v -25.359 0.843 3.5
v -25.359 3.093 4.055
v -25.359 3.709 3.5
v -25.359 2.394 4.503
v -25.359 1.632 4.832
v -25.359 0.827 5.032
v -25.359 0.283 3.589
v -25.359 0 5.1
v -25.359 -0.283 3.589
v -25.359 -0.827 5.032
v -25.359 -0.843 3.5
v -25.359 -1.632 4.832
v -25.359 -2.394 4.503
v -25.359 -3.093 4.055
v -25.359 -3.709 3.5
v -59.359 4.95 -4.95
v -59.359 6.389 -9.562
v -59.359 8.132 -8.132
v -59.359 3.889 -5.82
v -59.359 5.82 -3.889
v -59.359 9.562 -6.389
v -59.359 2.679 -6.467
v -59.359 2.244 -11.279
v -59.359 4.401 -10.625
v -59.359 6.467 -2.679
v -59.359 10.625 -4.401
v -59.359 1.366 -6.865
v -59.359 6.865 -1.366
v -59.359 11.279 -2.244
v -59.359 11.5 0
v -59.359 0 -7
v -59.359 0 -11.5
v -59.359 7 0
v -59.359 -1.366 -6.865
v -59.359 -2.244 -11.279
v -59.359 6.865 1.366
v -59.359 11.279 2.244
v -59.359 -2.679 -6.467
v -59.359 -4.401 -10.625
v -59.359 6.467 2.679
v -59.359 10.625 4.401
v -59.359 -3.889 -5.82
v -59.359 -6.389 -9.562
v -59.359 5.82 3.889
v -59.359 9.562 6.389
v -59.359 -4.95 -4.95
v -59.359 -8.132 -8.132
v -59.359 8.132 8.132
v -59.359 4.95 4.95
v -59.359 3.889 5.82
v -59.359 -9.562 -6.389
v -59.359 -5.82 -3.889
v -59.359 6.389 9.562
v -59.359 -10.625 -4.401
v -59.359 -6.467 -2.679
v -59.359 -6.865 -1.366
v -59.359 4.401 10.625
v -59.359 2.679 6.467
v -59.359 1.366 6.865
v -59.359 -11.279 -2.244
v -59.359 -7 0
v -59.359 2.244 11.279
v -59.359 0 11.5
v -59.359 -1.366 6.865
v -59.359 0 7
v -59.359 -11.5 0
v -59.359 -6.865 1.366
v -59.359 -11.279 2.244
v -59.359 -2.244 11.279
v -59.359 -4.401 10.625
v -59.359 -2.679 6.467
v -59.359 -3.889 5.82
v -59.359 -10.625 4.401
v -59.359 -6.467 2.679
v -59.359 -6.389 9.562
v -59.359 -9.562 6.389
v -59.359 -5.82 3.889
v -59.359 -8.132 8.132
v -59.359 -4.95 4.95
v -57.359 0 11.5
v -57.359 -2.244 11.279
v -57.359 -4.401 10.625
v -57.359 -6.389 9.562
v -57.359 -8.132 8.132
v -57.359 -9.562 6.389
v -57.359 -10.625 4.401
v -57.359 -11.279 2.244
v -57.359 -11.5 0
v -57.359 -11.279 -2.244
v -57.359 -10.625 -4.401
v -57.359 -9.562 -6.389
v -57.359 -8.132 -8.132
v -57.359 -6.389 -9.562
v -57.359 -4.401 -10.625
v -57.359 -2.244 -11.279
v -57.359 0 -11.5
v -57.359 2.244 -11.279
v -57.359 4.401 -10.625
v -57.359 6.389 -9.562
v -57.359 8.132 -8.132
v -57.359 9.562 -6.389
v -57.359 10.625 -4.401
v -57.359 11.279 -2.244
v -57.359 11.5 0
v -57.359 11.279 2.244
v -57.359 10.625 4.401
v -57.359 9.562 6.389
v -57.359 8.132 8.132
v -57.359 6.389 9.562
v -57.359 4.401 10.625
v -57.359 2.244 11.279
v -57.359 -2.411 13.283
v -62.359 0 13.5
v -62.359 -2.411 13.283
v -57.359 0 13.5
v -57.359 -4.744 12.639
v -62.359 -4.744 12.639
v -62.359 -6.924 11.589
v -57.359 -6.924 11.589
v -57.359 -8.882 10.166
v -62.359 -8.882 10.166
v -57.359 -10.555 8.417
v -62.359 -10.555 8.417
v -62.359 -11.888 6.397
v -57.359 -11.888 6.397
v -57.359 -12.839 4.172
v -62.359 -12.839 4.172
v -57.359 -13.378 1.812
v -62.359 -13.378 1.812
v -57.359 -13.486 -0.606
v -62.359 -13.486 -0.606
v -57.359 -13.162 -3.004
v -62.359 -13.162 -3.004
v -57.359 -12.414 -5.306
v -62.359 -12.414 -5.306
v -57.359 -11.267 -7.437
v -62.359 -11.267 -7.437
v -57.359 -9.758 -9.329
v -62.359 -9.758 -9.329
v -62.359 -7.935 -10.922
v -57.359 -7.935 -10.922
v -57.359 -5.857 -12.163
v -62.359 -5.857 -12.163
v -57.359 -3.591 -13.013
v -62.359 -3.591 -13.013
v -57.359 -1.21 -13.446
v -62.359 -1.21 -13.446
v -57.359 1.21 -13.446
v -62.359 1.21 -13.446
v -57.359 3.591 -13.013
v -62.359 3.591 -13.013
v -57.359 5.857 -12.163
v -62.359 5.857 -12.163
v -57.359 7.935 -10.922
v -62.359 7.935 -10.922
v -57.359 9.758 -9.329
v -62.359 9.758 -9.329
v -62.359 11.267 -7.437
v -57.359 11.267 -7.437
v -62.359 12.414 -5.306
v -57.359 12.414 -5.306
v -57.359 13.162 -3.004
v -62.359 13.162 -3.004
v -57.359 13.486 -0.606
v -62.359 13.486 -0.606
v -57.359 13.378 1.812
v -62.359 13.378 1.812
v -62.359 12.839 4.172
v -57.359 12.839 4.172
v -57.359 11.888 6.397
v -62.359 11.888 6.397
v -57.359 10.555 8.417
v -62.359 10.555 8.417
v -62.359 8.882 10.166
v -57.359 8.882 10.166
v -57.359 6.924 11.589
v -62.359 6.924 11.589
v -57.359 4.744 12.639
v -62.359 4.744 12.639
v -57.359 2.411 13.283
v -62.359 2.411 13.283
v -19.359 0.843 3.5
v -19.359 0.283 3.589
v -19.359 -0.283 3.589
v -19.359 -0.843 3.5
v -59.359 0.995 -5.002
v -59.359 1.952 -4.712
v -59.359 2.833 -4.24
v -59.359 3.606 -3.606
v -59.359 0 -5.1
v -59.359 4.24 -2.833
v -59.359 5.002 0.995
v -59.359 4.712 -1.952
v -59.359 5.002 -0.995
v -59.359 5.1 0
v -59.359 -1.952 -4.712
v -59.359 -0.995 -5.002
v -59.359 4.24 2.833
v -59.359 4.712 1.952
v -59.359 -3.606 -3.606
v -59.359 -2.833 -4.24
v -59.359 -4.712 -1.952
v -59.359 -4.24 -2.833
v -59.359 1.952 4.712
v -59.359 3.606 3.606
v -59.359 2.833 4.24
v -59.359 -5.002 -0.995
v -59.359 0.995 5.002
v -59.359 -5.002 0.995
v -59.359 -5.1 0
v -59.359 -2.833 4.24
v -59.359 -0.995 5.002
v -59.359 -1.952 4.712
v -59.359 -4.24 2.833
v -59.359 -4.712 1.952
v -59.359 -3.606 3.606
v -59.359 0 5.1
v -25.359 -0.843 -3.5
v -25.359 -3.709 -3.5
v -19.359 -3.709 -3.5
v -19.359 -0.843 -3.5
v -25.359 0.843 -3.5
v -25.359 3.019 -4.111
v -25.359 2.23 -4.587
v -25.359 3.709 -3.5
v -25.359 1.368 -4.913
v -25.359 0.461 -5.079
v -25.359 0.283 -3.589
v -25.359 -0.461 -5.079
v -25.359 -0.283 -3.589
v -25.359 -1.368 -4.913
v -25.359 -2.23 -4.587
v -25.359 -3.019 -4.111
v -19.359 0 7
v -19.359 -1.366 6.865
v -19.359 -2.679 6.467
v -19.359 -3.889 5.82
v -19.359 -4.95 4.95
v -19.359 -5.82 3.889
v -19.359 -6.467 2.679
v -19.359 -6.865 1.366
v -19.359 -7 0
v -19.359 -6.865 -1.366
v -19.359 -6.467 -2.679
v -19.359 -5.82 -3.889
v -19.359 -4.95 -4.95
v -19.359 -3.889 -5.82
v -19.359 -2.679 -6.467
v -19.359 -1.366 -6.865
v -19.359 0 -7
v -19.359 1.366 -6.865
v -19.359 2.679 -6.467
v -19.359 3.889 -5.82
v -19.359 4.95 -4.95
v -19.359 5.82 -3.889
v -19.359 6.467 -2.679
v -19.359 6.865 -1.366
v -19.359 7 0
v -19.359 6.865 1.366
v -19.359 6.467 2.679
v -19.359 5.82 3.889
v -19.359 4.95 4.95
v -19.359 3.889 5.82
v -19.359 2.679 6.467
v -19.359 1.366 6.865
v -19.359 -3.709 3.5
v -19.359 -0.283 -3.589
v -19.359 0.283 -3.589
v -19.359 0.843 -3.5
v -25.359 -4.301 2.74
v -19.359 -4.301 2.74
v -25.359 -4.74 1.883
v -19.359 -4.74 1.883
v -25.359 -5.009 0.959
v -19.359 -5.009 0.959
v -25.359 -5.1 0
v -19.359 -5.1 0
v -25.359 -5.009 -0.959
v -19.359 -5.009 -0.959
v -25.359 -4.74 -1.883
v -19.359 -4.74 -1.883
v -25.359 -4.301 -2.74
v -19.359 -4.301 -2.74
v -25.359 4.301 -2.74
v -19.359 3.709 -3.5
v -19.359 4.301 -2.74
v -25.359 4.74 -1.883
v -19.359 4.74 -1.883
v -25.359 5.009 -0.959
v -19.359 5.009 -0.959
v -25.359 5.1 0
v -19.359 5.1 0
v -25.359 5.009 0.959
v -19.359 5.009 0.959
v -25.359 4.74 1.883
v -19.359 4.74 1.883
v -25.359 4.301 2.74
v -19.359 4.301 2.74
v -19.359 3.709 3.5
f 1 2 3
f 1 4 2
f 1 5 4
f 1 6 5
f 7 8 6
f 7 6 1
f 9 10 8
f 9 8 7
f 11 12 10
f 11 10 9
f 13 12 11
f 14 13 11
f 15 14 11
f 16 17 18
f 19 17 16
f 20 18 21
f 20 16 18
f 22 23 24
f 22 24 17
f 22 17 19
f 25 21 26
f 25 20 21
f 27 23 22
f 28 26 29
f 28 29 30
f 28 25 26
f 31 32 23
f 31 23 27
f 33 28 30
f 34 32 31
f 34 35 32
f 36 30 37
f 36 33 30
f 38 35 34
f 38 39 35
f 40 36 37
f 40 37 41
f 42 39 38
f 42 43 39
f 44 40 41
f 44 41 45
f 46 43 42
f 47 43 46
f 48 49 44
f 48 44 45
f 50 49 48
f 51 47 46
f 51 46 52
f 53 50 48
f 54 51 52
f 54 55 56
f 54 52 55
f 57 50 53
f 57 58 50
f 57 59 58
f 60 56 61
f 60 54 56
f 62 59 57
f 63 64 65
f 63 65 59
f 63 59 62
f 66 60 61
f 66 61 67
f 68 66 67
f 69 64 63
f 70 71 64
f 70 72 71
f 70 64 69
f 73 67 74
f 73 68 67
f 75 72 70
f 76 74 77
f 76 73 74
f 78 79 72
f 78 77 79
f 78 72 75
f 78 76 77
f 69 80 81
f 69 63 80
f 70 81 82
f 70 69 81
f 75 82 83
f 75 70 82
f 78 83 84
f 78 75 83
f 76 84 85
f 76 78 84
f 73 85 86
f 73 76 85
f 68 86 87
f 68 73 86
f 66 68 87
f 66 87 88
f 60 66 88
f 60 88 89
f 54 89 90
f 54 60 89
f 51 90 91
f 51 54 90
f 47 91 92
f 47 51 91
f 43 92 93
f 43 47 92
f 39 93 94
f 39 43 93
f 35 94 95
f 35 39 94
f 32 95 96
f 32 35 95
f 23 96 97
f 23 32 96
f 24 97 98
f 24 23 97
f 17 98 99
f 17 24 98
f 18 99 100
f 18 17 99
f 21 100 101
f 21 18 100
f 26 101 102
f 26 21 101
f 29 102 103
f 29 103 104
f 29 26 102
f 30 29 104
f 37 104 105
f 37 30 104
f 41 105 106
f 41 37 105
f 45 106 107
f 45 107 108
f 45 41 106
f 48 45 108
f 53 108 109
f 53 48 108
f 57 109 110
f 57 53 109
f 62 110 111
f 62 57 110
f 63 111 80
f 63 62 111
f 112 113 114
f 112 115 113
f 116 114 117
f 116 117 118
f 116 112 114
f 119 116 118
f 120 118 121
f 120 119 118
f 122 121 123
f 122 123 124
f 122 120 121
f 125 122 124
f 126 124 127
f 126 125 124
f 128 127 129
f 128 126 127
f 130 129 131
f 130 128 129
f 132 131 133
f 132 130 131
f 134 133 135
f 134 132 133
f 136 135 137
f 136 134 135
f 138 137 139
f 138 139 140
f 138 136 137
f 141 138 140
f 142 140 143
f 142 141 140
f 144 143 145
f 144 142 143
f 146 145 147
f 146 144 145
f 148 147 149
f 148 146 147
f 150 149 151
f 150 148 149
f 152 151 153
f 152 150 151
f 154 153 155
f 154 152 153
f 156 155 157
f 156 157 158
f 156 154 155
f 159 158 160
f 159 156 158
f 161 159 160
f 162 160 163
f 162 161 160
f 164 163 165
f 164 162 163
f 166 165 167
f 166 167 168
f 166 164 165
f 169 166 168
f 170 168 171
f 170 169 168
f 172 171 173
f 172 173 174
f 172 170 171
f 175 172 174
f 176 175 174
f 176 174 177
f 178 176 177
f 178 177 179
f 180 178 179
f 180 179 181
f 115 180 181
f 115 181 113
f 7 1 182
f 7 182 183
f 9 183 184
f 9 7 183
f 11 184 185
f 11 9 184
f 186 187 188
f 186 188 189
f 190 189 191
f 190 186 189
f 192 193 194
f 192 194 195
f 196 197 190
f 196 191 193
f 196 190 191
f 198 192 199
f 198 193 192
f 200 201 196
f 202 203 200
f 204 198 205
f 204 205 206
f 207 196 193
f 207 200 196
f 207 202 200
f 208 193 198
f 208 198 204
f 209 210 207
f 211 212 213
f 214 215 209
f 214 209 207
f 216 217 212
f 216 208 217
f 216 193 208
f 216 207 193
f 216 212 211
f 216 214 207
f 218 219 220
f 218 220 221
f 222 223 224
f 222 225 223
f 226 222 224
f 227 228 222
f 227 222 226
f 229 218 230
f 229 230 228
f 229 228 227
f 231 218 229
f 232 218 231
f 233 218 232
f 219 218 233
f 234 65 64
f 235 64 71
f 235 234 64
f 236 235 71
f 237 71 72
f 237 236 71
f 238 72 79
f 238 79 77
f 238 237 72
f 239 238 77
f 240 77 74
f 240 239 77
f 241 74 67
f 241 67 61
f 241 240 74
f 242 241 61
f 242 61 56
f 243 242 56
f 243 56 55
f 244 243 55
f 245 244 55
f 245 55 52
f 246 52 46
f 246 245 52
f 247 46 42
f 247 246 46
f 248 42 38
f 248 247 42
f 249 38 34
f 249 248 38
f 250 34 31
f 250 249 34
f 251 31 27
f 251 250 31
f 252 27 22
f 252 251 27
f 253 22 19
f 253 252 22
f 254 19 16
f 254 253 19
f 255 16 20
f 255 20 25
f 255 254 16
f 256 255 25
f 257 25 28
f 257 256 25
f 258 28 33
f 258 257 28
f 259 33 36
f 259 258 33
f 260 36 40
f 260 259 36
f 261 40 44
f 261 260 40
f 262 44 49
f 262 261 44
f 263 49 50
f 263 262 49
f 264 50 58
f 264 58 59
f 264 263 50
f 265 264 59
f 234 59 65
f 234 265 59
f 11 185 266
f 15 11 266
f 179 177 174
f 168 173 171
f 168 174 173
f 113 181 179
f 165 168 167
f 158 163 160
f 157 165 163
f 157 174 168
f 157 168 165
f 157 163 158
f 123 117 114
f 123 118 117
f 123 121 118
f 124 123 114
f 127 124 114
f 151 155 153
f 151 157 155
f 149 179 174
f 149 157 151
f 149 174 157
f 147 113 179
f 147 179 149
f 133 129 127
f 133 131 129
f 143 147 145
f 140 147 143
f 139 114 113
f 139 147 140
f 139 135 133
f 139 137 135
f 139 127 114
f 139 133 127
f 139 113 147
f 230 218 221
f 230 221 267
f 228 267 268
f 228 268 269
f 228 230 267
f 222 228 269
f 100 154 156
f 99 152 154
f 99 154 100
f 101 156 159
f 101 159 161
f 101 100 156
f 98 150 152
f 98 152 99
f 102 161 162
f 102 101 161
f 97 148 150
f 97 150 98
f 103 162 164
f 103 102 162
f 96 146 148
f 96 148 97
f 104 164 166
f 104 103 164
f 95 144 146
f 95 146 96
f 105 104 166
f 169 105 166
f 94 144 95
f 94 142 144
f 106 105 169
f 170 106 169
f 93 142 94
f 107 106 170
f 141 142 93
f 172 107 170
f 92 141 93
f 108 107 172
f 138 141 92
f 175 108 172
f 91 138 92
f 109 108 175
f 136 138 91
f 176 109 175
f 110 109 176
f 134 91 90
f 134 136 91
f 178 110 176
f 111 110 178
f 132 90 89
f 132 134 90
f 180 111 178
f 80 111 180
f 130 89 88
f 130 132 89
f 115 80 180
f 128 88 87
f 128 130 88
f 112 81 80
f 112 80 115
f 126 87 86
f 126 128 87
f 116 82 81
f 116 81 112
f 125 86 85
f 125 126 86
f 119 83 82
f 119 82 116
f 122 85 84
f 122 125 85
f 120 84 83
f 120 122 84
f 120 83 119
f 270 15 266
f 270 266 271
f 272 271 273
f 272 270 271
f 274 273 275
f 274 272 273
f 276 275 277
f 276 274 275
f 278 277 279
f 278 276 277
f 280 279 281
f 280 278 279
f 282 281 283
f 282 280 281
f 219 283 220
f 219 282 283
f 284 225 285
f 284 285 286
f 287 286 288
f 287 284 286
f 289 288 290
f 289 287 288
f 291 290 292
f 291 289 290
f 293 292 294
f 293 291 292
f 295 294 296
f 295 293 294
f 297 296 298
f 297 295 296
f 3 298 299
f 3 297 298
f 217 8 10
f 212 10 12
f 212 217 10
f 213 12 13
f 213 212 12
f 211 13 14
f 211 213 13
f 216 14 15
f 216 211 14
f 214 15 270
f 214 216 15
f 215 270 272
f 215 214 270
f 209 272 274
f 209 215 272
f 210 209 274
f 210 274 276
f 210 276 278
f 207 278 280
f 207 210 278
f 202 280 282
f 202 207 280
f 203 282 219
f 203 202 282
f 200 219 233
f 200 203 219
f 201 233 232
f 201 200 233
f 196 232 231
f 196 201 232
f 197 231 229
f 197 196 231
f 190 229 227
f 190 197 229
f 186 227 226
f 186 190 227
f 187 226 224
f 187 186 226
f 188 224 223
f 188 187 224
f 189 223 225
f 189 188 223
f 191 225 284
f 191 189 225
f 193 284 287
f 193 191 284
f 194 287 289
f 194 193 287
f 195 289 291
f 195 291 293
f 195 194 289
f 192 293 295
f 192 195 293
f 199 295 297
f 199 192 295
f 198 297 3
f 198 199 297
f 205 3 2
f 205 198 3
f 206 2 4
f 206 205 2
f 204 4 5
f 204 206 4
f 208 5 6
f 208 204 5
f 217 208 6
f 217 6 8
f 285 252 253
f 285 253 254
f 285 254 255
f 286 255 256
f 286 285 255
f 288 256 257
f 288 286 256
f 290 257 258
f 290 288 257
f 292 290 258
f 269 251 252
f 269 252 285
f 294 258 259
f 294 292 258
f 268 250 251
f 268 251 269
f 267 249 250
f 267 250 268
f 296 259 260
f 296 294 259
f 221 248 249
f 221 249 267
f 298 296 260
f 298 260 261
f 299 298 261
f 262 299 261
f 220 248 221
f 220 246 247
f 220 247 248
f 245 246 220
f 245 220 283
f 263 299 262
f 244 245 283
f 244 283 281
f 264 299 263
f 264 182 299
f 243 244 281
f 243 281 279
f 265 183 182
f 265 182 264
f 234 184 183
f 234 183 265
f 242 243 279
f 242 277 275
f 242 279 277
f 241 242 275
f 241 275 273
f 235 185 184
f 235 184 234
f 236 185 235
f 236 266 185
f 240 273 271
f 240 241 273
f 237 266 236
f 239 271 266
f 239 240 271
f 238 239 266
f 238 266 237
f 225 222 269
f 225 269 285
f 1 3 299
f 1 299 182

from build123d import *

# Parameters (mm, degrees)
CUT_EXTRUDE_START   = -6
CUT_EXTRUDE_1_DEPTH = 6


with BuildPart() as part:
    # 草图1 → 旋转1 (revolve)
    with BuildSketch(Plane.XY, mode=Mode.PRIVATE) as revolve_1_sk:
        Polygon((-59.358604437, 0), (-62.358604437, 0), (-62.358604437, 13.5), (-57.358604437, 13.5), (-57.358604437, 11.5), (-59.358604437, 11.5), (-59.358604437, 7), (-19.358604437, 7), (-19.358604437, 3.6), (-25.358604437, 3.6), (-25.358604437, 5.1), (-59.358604437, 5.1), align=None)
    revolve(revolve_1_sk.sketch.rotate(Axis((-81.741157905, 0, 0), (1, 0, 0)), 90), axis=Axis((-81.741157905, 0, 0), (1, 0, 0)))

    # 草图2 → 切除-拉伸1 (cut)
    with BuildSketch(Plane(origin=(-19.358604437, 0, 0), x_dir=(0, 0, -1), z_dir=(1, 0, 0)).offset(CUT_EXTRUDE_START)):
        with BuildLine():
            Line((-3.5, 3.709447398), (-3.5, -3.709447398))
            ThreePointArc((-3.5, -3.709447398), (0, -5.1), (3.5, -3.709447398))
            Line((3.5, -3.709447398), (3.5, 3.709447398))
            ThreePointArc((3.5, 3.709447398), (0, 5.1), (-3.5, 3.709447398))
        make_face()
    extrude(amount=CUT_EXTRUDE_1_DEPTH, mode=Mode.SUBTRACT)


solid = part.part
